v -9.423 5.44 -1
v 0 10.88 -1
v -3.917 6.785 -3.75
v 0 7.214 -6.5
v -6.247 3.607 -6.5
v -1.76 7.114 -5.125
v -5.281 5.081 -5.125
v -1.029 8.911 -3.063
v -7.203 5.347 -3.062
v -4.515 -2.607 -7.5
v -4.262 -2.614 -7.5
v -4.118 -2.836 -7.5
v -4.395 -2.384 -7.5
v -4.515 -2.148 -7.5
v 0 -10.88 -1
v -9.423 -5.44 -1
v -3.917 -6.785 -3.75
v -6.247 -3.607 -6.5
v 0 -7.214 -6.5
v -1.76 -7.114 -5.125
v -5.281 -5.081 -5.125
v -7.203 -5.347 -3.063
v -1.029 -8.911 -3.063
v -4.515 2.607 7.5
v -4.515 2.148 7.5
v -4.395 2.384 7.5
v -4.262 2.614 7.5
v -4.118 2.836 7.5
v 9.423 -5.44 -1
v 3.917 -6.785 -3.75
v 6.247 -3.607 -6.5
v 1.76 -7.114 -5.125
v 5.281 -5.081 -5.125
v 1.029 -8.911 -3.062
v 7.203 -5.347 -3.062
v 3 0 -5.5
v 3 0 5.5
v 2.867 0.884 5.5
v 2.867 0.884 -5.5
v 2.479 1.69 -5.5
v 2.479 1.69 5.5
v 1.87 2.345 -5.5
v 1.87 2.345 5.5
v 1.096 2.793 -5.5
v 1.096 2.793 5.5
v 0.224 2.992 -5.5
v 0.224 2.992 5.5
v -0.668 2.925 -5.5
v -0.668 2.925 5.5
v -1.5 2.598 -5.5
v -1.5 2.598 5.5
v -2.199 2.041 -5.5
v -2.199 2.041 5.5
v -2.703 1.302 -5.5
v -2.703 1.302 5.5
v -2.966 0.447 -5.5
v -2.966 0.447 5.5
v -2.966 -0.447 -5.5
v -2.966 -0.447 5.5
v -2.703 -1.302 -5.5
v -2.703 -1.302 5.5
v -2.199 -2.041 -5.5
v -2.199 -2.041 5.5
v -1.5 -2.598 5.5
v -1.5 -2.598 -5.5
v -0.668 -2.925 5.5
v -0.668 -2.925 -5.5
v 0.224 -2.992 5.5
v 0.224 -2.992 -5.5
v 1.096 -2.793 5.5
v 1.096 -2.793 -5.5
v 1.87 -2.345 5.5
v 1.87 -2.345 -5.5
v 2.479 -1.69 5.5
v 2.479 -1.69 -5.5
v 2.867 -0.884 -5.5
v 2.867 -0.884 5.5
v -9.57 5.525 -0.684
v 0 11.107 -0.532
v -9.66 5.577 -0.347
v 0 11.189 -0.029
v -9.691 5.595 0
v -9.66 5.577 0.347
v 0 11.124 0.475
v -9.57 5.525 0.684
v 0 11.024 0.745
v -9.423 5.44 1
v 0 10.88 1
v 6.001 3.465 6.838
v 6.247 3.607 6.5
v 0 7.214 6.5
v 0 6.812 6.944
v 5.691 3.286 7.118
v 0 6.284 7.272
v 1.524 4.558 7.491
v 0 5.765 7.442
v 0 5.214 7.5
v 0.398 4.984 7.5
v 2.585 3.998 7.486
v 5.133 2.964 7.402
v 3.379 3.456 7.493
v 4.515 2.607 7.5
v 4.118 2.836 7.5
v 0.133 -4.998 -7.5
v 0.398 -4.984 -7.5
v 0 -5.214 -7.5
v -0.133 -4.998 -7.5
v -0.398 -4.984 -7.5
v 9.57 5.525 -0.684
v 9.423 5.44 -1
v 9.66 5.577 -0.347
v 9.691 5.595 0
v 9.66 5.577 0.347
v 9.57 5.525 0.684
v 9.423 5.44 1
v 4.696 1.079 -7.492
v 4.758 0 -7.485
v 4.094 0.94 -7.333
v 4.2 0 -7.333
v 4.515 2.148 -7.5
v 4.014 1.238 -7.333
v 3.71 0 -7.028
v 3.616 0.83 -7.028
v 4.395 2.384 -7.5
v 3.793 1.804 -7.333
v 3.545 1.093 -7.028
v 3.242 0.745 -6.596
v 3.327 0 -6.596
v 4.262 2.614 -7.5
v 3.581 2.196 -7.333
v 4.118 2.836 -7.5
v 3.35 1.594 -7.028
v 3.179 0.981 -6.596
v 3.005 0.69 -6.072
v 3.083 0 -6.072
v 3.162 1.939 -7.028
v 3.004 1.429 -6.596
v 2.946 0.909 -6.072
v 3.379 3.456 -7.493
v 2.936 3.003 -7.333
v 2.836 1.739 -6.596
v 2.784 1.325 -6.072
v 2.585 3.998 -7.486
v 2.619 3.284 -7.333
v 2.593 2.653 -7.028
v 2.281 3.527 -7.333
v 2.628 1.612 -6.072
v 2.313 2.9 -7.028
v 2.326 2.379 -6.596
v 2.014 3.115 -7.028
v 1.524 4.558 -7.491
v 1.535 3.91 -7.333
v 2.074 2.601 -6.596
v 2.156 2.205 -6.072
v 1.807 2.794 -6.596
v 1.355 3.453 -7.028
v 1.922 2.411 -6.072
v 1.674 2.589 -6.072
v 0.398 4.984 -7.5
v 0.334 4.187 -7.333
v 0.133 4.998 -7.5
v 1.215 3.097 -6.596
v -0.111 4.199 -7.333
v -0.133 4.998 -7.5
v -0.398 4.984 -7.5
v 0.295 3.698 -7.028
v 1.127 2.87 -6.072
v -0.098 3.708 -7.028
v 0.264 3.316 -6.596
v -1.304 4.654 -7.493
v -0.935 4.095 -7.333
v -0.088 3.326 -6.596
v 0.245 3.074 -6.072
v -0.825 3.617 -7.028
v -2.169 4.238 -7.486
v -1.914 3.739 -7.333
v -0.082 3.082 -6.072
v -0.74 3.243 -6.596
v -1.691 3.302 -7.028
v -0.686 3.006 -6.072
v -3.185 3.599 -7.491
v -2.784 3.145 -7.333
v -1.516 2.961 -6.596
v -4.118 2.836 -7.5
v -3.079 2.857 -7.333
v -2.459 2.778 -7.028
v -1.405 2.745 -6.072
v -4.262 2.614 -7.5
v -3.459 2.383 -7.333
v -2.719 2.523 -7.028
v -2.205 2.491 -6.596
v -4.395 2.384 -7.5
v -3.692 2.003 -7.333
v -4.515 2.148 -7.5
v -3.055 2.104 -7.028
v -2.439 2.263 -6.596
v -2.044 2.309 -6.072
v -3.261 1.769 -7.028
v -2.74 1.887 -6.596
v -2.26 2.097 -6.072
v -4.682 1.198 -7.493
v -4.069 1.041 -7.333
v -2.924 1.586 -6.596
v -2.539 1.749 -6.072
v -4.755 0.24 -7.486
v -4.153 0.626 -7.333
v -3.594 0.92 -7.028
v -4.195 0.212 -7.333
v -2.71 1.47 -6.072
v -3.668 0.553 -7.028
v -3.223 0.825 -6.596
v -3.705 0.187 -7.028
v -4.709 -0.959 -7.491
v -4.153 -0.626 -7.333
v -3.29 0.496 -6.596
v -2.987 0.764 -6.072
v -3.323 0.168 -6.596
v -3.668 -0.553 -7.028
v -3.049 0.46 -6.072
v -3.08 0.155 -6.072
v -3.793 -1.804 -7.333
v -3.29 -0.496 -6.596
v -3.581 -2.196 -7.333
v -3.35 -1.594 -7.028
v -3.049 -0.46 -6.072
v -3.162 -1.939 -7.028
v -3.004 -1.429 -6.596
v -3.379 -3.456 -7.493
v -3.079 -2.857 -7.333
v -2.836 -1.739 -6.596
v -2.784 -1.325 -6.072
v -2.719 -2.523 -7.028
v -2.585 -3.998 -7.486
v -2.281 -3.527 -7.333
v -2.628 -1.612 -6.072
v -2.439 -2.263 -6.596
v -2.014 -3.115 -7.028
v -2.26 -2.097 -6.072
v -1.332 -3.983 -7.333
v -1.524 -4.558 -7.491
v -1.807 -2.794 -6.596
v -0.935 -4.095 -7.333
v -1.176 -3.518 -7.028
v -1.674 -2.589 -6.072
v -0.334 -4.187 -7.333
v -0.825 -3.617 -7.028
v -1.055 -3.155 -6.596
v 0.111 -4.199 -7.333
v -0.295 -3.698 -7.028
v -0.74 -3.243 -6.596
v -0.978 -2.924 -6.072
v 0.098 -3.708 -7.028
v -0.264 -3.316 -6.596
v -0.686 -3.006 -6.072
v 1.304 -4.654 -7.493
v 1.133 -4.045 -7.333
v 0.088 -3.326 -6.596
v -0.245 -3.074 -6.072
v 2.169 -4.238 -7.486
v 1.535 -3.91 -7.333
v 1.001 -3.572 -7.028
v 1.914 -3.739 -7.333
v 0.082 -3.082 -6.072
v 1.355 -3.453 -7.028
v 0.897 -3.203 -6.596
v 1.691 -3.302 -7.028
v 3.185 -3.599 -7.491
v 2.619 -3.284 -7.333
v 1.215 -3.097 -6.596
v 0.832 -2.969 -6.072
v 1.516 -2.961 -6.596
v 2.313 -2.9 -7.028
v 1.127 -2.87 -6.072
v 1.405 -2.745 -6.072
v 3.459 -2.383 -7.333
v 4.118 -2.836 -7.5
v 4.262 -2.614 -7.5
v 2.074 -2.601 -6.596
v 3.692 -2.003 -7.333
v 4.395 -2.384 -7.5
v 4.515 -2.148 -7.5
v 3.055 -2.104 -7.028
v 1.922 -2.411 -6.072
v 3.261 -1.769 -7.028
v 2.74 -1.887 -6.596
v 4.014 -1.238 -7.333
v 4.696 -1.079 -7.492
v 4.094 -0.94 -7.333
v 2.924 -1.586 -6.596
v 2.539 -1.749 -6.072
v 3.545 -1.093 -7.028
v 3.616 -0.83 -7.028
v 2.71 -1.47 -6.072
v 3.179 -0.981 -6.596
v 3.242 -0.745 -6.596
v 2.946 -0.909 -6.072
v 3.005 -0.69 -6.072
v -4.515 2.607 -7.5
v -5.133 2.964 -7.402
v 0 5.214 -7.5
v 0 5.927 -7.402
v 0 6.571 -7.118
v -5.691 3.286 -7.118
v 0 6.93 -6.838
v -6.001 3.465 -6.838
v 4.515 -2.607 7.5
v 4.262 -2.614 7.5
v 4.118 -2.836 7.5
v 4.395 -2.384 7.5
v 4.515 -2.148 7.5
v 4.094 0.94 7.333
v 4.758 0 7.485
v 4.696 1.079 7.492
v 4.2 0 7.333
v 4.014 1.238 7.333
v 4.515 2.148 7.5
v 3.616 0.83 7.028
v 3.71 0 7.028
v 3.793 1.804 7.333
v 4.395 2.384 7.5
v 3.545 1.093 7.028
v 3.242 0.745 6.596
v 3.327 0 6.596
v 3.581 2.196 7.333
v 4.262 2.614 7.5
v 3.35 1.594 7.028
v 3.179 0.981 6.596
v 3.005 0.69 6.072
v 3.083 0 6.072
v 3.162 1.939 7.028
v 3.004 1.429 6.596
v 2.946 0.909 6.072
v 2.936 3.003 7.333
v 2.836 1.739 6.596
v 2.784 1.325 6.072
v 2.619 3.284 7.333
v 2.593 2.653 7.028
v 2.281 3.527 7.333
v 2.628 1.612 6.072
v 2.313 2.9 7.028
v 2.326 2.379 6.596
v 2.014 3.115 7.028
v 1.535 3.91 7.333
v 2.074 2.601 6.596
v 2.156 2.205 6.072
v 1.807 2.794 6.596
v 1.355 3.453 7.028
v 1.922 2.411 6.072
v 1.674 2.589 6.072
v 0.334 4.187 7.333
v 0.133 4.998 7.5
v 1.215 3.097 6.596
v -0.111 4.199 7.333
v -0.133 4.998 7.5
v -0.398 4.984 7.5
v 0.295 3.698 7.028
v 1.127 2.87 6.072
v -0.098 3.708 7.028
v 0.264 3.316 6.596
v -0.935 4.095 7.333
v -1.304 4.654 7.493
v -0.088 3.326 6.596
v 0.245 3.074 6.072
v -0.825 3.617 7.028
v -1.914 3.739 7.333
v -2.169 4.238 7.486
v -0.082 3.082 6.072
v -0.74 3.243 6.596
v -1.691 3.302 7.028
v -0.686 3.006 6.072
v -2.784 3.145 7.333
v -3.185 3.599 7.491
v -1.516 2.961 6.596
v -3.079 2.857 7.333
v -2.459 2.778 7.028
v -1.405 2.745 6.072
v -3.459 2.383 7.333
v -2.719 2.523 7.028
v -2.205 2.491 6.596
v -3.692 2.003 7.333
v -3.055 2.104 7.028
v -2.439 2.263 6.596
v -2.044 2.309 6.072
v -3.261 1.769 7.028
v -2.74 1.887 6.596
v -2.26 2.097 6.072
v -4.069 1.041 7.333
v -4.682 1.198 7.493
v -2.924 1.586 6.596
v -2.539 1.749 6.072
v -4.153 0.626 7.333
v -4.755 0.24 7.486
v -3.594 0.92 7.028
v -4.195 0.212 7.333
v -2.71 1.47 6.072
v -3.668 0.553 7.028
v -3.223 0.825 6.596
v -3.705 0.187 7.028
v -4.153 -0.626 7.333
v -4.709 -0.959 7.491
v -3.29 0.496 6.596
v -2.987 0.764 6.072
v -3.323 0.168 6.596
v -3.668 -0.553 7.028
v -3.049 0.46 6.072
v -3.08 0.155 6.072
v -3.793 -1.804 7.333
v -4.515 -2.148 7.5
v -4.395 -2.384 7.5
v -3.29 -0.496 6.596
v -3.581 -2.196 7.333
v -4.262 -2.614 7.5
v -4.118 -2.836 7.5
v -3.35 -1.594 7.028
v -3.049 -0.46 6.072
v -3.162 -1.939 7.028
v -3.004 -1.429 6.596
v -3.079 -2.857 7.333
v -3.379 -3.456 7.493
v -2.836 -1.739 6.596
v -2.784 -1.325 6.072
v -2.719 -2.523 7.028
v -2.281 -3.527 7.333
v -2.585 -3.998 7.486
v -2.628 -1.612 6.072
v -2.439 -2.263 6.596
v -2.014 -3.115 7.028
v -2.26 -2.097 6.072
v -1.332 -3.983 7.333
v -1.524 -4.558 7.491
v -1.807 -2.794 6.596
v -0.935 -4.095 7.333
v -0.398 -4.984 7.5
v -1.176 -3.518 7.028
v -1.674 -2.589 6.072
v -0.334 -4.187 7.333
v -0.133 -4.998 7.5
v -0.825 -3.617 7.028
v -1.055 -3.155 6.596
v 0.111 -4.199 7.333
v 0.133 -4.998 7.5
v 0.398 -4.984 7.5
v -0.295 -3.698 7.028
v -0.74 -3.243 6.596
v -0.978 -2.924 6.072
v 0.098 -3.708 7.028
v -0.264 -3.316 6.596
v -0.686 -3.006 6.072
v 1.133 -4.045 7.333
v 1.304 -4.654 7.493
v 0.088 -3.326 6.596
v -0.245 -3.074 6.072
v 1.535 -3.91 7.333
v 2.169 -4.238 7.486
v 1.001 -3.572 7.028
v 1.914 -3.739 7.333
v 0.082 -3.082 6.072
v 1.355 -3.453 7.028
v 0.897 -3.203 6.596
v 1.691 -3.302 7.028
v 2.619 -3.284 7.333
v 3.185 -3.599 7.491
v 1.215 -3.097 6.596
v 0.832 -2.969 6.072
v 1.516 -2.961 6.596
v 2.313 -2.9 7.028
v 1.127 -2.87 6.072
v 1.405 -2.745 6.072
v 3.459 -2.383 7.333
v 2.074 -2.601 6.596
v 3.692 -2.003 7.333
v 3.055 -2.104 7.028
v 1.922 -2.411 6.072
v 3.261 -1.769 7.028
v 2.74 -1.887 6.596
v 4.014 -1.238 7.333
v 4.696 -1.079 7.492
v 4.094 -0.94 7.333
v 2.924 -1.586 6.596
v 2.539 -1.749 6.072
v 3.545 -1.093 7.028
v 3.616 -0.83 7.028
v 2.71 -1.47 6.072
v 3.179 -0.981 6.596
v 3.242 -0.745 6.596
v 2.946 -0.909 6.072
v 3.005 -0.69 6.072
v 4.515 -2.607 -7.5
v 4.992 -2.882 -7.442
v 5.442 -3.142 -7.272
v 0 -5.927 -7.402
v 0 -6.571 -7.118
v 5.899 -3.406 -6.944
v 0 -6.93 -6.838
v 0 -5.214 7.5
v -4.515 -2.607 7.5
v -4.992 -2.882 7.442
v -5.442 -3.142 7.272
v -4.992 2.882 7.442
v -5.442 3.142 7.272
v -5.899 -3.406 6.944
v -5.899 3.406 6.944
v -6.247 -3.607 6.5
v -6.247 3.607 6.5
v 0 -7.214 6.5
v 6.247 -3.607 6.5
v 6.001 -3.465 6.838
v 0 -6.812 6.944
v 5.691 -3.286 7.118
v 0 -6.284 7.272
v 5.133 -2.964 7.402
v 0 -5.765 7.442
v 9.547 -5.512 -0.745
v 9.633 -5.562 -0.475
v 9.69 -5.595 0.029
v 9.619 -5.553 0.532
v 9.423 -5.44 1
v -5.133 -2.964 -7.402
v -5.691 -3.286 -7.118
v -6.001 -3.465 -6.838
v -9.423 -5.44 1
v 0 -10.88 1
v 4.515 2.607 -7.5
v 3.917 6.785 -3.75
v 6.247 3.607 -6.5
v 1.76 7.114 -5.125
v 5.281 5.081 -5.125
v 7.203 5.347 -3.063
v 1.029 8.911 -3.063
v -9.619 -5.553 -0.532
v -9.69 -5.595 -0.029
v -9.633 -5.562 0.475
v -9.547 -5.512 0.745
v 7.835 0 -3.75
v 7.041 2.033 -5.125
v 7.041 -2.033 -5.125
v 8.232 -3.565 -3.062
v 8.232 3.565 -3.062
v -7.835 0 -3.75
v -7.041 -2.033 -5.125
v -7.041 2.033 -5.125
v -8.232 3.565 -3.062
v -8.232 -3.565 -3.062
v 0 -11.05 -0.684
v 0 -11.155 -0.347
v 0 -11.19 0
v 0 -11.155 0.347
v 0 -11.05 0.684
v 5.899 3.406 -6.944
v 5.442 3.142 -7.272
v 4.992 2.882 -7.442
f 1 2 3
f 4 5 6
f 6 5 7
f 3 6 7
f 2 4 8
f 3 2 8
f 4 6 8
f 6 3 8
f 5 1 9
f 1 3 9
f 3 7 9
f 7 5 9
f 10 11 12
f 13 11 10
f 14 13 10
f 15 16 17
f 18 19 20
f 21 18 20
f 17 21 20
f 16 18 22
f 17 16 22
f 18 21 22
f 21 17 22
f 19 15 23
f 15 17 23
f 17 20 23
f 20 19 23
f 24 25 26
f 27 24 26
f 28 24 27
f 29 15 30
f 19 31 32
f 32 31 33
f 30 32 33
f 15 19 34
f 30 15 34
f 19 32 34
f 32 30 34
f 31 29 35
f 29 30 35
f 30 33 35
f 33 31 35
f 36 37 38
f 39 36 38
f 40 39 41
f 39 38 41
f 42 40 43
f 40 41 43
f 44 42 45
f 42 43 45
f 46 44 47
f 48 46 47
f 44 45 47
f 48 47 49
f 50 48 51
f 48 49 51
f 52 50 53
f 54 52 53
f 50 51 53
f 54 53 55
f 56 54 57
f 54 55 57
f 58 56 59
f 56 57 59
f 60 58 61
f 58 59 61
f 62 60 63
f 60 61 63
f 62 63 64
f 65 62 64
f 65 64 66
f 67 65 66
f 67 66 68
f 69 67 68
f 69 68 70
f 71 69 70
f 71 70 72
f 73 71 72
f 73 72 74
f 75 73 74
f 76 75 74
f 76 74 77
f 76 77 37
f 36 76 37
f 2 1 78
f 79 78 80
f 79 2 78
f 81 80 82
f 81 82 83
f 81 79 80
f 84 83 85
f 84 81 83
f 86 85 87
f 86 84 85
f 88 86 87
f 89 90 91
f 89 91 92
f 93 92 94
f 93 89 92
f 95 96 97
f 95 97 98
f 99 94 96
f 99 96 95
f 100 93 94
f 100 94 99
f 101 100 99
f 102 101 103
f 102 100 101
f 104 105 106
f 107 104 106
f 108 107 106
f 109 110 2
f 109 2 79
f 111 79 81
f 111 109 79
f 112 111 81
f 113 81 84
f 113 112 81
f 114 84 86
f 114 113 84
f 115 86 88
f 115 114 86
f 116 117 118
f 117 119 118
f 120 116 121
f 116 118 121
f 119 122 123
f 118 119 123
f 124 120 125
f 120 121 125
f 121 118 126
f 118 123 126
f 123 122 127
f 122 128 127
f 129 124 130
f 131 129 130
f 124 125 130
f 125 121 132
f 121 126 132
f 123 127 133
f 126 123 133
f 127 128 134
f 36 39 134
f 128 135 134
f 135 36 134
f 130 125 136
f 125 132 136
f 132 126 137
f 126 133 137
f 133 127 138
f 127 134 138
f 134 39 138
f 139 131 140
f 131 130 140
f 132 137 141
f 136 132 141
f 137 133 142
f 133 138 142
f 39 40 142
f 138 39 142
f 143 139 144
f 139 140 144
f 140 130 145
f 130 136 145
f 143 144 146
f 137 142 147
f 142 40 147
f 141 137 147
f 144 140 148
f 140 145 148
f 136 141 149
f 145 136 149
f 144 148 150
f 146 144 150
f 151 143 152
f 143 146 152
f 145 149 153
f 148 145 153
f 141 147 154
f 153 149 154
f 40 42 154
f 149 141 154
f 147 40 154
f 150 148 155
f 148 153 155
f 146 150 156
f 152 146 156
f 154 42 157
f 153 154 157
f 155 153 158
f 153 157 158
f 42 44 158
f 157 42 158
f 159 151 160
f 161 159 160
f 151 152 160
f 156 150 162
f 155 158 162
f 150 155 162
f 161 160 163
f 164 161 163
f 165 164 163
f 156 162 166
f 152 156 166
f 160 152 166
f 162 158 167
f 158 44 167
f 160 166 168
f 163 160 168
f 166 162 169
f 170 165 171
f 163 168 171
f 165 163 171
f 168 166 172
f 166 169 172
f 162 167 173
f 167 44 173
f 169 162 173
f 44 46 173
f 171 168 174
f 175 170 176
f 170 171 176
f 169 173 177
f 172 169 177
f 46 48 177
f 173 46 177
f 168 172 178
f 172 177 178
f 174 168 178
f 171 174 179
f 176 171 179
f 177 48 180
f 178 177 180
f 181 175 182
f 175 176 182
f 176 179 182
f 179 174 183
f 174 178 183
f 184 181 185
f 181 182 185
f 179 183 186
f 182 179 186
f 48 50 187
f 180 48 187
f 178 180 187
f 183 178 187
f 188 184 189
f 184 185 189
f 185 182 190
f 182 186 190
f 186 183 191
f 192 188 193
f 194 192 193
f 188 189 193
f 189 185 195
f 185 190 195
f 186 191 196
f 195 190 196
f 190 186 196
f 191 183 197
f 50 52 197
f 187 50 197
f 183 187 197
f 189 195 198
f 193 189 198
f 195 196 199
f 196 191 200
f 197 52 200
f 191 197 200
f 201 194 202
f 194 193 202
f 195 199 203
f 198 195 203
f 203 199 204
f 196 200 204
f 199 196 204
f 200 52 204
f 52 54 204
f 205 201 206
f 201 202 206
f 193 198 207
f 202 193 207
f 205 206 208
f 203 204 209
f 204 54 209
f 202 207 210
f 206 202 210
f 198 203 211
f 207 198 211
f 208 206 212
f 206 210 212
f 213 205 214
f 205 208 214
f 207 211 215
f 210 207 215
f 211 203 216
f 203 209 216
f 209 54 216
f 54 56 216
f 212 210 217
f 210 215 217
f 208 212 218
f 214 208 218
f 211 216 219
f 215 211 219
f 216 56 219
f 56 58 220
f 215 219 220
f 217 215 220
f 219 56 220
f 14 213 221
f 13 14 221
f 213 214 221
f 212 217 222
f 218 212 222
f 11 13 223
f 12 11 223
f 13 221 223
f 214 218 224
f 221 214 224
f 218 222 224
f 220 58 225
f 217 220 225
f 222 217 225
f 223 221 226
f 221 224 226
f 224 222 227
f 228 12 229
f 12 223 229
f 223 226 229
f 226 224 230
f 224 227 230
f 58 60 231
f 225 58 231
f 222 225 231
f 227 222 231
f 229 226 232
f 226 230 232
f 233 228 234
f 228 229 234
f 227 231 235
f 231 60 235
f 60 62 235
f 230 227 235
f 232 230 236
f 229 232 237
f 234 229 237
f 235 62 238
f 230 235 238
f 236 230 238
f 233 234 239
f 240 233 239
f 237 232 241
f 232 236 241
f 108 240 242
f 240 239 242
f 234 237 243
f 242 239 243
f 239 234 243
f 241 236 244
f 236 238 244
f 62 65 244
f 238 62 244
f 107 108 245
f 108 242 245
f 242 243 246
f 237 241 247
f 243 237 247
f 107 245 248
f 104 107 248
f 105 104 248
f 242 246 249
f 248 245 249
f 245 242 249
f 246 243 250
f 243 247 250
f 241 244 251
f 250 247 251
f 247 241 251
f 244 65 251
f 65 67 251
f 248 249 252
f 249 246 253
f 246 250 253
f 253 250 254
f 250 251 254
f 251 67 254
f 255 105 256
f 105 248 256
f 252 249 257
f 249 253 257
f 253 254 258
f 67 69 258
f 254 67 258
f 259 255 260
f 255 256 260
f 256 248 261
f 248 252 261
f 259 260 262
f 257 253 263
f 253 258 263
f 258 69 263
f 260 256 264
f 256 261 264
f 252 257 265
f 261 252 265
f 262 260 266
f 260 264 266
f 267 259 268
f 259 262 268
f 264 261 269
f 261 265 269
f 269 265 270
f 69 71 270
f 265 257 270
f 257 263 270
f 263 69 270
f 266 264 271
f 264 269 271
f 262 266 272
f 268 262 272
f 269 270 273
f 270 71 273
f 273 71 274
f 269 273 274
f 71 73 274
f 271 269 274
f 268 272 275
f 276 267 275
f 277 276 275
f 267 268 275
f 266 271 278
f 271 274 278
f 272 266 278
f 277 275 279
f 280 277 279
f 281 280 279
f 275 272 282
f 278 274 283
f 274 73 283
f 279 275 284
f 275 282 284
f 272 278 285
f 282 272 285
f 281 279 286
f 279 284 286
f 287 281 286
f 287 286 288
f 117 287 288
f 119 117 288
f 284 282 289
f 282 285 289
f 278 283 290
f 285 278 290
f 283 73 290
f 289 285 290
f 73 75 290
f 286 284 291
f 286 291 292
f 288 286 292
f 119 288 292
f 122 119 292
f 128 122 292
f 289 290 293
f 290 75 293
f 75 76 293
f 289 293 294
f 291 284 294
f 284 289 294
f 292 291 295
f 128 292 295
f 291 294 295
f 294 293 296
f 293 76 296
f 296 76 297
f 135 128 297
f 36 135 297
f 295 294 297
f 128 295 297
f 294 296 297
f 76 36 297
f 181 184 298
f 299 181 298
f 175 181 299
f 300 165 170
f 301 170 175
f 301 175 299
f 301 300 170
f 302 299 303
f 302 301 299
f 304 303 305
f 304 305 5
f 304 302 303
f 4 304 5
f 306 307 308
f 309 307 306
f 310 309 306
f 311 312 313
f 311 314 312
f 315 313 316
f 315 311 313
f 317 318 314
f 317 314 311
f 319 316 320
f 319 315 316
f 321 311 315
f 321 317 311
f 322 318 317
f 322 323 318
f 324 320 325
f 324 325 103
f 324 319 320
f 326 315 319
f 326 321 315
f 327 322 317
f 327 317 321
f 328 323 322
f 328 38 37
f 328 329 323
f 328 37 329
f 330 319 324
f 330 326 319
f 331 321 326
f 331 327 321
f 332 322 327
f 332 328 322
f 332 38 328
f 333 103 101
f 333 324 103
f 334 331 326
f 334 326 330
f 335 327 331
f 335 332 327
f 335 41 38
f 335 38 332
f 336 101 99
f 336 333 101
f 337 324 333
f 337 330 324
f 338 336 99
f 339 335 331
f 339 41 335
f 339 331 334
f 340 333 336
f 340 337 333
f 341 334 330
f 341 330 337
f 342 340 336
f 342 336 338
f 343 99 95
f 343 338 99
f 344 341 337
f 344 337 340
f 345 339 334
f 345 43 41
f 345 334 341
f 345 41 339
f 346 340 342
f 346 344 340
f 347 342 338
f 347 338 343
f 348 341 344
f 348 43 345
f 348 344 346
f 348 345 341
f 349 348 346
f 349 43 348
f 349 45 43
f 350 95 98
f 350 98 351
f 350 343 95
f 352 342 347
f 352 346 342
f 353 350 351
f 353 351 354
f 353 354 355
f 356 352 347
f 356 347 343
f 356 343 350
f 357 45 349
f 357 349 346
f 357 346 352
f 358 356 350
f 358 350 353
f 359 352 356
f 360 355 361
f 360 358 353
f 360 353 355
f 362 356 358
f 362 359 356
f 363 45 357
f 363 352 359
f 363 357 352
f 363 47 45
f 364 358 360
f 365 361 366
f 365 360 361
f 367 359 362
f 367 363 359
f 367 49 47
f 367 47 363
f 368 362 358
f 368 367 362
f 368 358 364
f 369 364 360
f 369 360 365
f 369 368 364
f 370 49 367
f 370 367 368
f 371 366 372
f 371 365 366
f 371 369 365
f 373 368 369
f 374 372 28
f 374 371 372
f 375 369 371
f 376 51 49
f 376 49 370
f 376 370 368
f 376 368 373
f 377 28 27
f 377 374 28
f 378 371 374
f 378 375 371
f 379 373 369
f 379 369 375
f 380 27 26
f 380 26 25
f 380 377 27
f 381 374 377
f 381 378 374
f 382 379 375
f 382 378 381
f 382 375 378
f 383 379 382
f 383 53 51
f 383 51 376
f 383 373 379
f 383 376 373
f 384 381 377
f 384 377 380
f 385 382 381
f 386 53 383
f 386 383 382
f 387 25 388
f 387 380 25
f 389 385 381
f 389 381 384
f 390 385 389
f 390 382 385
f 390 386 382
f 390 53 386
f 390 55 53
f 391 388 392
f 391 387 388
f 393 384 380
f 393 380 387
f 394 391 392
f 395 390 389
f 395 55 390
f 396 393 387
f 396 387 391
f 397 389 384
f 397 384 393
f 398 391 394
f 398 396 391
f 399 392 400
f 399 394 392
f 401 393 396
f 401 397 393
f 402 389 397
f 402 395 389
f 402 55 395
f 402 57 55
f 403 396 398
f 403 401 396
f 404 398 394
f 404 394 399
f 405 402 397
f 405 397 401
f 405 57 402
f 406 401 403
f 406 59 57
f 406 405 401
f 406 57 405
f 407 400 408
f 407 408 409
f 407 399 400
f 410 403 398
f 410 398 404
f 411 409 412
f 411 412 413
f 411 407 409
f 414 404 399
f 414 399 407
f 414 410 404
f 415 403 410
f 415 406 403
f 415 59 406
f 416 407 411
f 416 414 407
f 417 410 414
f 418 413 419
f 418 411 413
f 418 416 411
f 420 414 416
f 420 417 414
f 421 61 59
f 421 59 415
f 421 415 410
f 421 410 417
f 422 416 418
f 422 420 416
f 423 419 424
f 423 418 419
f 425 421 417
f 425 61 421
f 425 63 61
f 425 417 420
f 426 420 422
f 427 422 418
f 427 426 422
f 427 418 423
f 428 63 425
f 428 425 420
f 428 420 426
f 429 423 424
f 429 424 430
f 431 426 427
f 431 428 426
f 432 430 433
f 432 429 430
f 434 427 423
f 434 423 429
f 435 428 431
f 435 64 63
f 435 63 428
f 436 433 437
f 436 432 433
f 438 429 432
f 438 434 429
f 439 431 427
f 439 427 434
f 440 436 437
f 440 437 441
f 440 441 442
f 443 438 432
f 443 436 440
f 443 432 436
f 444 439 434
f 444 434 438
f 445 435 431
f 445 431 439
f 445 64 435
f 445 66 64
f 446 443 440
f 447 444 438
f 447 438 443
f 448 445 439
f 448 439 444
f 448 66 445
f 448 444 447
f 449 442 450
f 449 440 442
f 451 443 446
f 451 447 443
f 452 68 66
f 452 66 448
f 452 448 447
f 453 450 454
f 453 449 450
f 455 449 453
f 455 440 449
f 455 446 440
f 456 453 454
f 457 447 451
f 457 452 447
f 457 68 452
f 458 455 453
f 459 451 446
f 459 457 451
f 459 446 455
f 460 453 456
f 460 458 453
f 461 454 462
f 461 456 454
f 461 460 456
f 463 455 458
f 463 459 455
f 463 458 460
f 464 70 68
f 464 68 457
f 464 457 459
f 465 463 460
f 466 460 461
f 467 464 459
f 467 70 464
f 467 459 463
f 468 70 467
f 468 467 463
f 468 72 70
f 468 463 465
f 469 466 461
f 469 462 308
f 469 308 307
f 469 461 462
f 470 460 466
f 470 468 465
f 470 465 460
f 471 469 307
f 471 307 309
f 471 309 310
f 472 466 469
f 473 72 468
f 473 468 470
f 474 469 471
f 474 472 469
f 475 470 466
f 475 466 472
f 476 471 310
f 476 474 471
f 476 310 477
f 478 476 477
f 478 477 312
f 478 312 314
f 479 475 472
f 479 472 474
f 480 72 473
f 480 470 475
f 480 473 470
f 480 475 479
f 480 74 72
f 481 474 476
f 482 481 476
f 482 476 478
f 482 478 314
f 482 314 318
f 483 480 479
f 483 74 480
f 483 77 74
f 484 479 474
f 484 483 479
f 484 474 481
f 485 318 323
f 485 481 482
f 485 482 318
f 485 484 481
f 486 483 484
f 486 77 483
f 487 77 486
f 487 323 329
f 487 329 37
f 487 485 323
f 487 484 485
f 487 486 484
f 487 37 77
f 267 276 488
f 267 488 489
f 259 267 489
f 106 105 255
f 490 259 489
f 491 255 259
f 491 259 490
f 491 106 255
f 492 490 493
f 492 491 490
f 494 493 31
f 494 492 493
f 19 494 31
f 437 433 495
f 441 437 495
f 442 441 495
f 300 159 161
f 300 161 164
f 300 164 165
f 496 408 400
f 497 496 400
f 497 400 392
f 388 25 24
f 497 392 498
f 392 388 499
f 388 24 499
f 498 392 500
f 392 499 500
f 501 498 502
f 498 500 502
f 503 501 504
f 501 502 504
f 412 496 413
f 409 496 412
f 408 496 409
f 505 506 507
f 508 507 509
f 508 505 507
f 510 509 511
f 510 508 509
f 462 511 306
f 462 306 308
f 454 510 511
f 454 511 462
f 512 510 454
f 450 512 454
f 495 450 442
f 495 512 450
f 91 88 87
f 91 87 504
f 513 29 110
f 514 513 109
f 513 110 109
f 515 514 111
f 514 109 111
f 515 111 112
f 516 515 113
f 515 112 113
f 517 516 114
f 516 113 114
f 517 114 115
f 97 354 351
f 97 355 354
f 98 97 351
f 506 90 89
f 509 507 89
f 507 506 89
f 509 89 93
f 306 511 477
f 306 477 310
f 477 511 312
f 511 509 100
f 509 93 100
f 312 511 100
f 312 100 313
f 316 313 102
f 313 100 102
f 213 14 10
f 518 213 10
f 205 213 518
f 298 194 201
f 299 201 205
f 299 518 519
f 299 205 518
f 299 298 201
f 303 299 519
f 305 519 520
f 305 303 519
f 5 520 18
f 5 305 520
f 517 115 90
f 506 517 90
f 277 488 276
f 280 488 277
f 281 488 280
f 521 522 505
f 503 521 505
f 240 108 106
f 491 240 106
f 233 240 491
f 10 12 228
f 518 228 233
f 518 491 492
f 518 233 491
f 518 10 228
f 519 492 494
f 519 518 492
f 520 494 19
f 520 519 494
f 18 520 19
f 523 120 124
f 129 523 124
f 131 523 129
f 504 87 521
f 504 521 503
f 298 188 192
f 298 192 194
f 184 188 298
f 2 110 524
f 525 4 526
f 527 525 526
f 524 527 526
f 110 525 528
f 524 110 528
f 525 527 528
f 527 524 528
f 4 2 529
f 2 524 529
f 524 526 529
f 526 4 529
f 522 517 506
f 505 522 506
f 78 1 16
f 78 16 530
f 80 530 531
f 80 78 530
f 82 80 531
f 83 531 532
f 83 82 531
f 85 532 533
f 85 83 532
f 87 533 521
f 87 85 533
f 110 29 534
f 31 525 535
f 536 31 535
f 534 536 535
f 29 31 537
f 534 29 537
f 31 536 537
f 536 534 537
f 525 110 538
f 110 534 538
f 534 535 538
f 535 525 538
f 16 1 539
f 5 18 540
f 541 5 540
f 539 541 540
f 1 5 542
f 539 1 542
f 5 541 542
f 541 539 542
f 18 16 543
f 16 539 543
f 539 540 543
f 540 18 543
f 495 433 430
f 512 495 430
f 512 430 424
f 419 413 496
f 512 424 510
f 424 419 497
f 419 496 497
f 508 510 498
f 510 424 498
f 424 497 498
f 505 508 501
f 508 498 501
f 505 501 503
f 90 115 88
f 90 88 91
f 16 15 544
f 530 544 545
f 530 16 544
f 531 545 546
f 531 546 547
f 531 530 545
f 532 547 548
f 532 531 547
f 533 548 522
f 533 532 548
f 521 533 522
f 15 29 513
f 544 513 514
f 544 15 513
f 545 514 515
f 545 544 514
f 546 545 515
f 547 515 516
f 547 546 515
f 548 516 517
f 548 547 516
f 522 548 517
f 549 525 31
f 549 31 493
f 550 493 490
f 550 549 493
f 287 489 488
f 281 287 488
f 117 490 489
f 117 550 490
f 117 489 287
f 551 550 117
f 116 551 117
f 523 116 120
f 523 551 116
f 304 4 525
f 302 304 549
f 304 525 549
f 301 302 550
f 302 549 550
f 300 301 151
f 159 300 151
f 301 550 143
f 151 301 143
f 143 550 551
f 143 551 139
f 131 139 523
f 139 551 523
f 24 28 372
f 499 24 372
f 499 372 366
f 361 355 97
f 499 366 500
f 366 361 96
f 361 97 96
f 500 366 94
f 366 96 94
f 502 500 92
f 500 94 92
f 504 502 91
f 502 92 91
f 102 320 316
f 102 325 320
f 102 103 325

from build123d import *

# Parameters (mm, degrees)
F1_DEPTH     = 7.5
F1_TAPER     = 30
F2_R         = 3
F3_DEPTH     = 15.0010001
F4_T1_DEPTH  = 17.3205080757
F4_T3_DEPTH  = 12.3205080757
F4_T5_DEPTH  = 17.3205080757
F4_T7_DEPTH  = 12.3205080757
F4_T9_DEPTH  = 12.3205080757
F4_T11_DEPTH = 12.3205080757
F4_T13_DEPTH = 12.3205080757
F4_T15_DEPTH = 17.3205080757
F4_T17_DEPTH = 17.3205080757
F4_T19_DEPTH = 17.3205080757


# Not quite as in the source:
# - a fillet or chamfer that OpenCascade refuses, or shapes differently, is made with other operations: its cross-section is extruded or revolved along the edge and cut away or added


with BuildPart() as f1:
    # F0 (on Top) → F1 (new body, symmetric)
    with BuildSketch(Plane.XY):
        Polygon((10, -5.7735026919), (10, 5.7735026919), (0, 11.5470053838), (-10, 5.7735026919), (-10, -5.7735026919), (0, -11.5470053838), align=None)
    extrude(amount=F1_DEPTH, both=True, taper=F1_TAPER)

    # F2 (on face) → F3 (cut, through all)
    with BuildSketch(Plane.XY.offset(7.5)):
        Circle(F2_R)
    extrude(amount=-F3_DEPTH, mode=Mode.SUBTRACT)

    # F4: fillet of radius 2 on 21 edges, made by hand

    # F4_s2 → F4_t1 (cut)
    with BuildSketch(Plane.XZ.offset(-8.6602540378)):
        with BuildLine():
            ThreePointArc((9.4226497308, -1), (9.6905989232, 0), (9.4226497308, 1))
            Line((9.4226497308, 1), (10, 0))
            Line((10, 0), (9.4226497308, -1))
        make_face()
        with BuildLine():
            ThreePointArc((-9.4226497308, -1), (-9.6905989232, 0), (-9.4226497308, 1))
            Line((-9.4226497308, 1), (-10, 0))
            Line((-10, 0), (-9.4226497308, -1))
        make_face()
    extrude(amount=F4_T1_DEPTH, mode=Mode.SUBTRACT)

    # F4_s4 → F4_t3 (cut)
    with BuildSketch(Plane.XZ.offset(-6.1602540378)):
        with BuildLine():
            ThreePointArc((6.2472232503, -6.5), (5.5151724427, -7.2320508076), (4.5151724427, -7.5))
            Line((4.5151724427, -7.5), (5.6698729811, -7.5))
            Line((5.6698729811, -7.5), (6.2472232503, -6.5))
        make_face()
        with BuildLine():
            ThreePointArc((6.2472232503, 6.5), (5.5151724427, 7.2320508076), (4.5151724427, 7.5))
            Line((4.5151724427, 7.5), (5.6698729811, 7.5))
            Line((5.6698729811, 7.5), (6.2472232503, 6.5))
        make_face()
        with BuildLine():
            ThreePointArc((-4.5151724427, -7.5), (-5.5151724427, -7.2320508076), (-6.2472232503, -6.5))
            Line((-6.2472232503, -6.5), (-5.6698729811, -7.5))
            Line((-5.6698729811, -7.5), (-4.5151724427, -7.5))
        make_face()
        with BuildLine():
            ThreePointArc((-4.5151724427, 7.5), (-5.5151724427, 7.2320508076), (-6.2472232503, 6.5))
            Line((-6.2472232503, 6.5), (-5.6698729811, 7.5))
            Line((-5.6698729811, 7.5), (-4.5151724427, 7.5))
        make_face()
    extrude(amount=F4_T3_DEPTH, mode=Mode.SUBTRACT)

    # F4_s6 → F4_t5 (cut)
    with BuildSketch(Plane(origin=(7.5, -4.3301270189, 0), x_dir=(0, 0, 1), z_dir=(-0.8660254038, 0.5, 0))):
        with BuildLine():
            ThreePointArc((-1, 9.4226497308), (0, 9.6905989232), (1, 9.4226497308))
            Line((1, 9.4226497308), (0, 10))
            Line((0, 10), (-1, 9.4226497308))
        make_face()
    extrude(amount=F4_T5_DEPTH, mode=Mode.SUBTRACT)

    # F4_s8 → F4_t7 (cut)
    with BuildSketch(Plane(origin=(5.3349364905, -3.0801270189, 0), x_dir=(0, 0, 1), z_dir=(-0.8660254038, 0.5, 0))):
        with BuildLine():
            ThreePointArc((-6.5, 6.2472232503), (-7.2320508076, 5.5151724427), (-7.5, 4.5151724427))
            Line((-7.5, 4.5151724427), (-7.5, 5.6698729811))
            Line((-7.5, 5.6698729811), (-6.5, 6.2472232503))
        make_face()
        with BuildLine():
            ThreePointArc((6.5, 6.2472232503), (7.2320508076, 5.5151724427), (7.5, 4.5151724427))
            Line((7.5, 4.5151724427), (7.5, 5.6698729811))
            Line((7.5, 5.6698729811), (6.5, 6.2472232503))
        make_face()
    extrude(amount=F4_T7_DEPTH, mode=Mode.SUBTRACT)

    # F4_s10 → F4_t9 (cut)
    with BuildSketch(Plane(origin=(-5.3349364905, -3.0801270189, 0), x_dir=(0, 0, 1), z_dir=(0.8660254038, 0.5, 0))):
        with BuildLine():
            ThreePointArc((-7.5, 4.5151724427), (-7.2320508076, 5.5151724427), (-6.5, 6.2472232503))
            Line((-6.5, 6.2472232503), (-7.5, 5.6698729811))
            Line((-7.5, 5.6698729811), (-7.5, 4.5151724427))
        make_face()
        with BuildLine():
            ThreePointArc((6.5, 6.2472232503), (7.2320508076, 5.5151724427), (7.5, 4.5151724427))
            Line((7.5, 4.5151724427), (7.5, 5.6698729811))
            Line((7.5, 5.6698729811), (6.5, 6.2472232503))
        make_face()
    extrude(amount=F4_T9_DEPTH, mode=Mode.SUBTRACT)

    # F4_s12 → F4_t11 (cut)
    with BuildSketch(Plane(origin=(-5.3349364905, 3.0801270189, 0), x_dir=(0, 0, 1), z_dir=(0.8660254038, -0.5, 0))):
        with BuildLine():
            ThreePointArc((-7.5, 4.5151724427), (-7.2320508076, 5.5151724427), (-6.5, 6.2472232503))
            Line((-6.5, 6.2472232503), (-7.5, 5.6698729811))
            Line((-7.5, 5.6698729811), (-7.5, 4.5151724427))
        make_face()
        with BuildLine():
            ThreePointArc((7.5, 4.5151724427), (7.2320508076, 5.5151724427), (6.5, 6.2472232503))
            Line((6.5, 6.2472232503), (7.5, 5.6698729811))
            Line((7.5, 5.6698729811), (7.5, 4.5151724427))
        make_face()
    extrude(amount=F4_T11_DEPTH, mode=Mode.SUBTRACT)

    # F4_s14 → F4_t13 (cut)
    with BuildSketch(Plane(origin=(5.3349364905, 3.0801270189, 0), x_dir=(0, 0, 1), z_dir=(-0.8660254038, -0.5, 0))):
        with BuildLine():
            ThreePointArc((-7.5, 4.5151724427), (-7.2320508076, 5.5151724427), (-6.5, 6.2472232503))
            Line((-6.5, 6.2472232503), (-7.5, 5.6698729811))
            Line((-7.5, 5.6698729811), (-7.5, 4.5151724427))
        make_face()
        with BuildLine():
            ThreePointArc((7.5, 4.5151724427), (7.2320508076, 5.5151724427), (6.5, 6.2472232503))
            Line((6.5, 6.2472232503), (7.5, 5.6698729811))
            Line((7.5, 5.6698729811), (7.5, 4.5151724427))
        make_face()
    extrude(amount=F4_T13_DEPTH, mode=Mode.SUBTRACT)

    # F4_s16 → F4_t15 (cut)
    with BuildSketch(Plane(origin=(-7.5, -4.3301270189, 0), x_dir=(0, 0, 1), z_dir=(0.8660254038, 0.5, 0))):
        with BuildLine():
            ThreePointArc((-1, 9.4226497308), (0, 9.6905989232), (1, 9.4226497308))
            Line((1, 9.4226497308), (0, 10))
            Line((0, 10), (-1, 9.4226497308))
        make_face()
    extrude(amount=F4_T15_DEPTH, mode=Mode.SUBTRACT)

    # F4_s18 → F4_t17 (cut)
    with BuildSketch(Plane(origin=(7.5, 4.3301270189, 0), x_dir=(0, 0, 1), z_dir=(-0.8660254038, -0.5, 0))):
        with BuildLine():
            ThreePointArc((-1, 9.4226497308), (0, 9.6905989232), (1, 9.4226497308))
            Line((1, 9.4226497308), (0, 10))
            Line((0, 10), (-1, 9.4226497308))
        make_face()
    extrude(amount=F4_T17_DEPTH, mode=Mode.SUBTRACT)

    # F4_s20 → F4_t19 (cut)
    with BuildSketch(Plane(origin=(-7.5, 4.3301270189, 0), x_dir=(0, 0, 1), z_dir=(0.8660254038, -0.5, 0))):
        with BuildLine():
            ThreePointArc((-1, 9.4226497308), (0, 9.6905989232), (1, 9.4226497308))
            Line((1, 9.4226497308), (0, 10))
            Line((0, 10), (-1, 9.4226497308))
        make_face()
    extrude(amount=F4_T19_DEPTH, mode=Mode.SUBTRACT)

    # F4_s21 → F4_t22 (revolve, cut)
    with BuildSketch(Plane.XZ):
        with BuildLine():
            ThreePointArc((5, -7.5), (3.5857864376, -6.9142135624), (3, -5.5))
            Line((3, -5.5), (3, -7.5))
            Line((3, -7.5), (5, -7.5))
        make_face()
    revolve(axis=Axis((0, 0, -7.5), (0, 0, 1)), mode=Mode.SUBTRACT)

    # F4_s23 → F4_t24 (revolve, cut)
    with BuildSketch(Plane.XZ):
        with BuildLine():
            ThreePointArc((5, 7.5), (3.5857864376, 6.9142135624), (3, 5.5))
            Line((3, 5.5), (3, 7.5))
            Line((3, 7.5), (5, 7.5))
        make_face()
    revolve(axis=Axis((0, 0, 7.5), (0, 0, 1)), mode=Mode.SUBTRACT)


solid = f1.part
